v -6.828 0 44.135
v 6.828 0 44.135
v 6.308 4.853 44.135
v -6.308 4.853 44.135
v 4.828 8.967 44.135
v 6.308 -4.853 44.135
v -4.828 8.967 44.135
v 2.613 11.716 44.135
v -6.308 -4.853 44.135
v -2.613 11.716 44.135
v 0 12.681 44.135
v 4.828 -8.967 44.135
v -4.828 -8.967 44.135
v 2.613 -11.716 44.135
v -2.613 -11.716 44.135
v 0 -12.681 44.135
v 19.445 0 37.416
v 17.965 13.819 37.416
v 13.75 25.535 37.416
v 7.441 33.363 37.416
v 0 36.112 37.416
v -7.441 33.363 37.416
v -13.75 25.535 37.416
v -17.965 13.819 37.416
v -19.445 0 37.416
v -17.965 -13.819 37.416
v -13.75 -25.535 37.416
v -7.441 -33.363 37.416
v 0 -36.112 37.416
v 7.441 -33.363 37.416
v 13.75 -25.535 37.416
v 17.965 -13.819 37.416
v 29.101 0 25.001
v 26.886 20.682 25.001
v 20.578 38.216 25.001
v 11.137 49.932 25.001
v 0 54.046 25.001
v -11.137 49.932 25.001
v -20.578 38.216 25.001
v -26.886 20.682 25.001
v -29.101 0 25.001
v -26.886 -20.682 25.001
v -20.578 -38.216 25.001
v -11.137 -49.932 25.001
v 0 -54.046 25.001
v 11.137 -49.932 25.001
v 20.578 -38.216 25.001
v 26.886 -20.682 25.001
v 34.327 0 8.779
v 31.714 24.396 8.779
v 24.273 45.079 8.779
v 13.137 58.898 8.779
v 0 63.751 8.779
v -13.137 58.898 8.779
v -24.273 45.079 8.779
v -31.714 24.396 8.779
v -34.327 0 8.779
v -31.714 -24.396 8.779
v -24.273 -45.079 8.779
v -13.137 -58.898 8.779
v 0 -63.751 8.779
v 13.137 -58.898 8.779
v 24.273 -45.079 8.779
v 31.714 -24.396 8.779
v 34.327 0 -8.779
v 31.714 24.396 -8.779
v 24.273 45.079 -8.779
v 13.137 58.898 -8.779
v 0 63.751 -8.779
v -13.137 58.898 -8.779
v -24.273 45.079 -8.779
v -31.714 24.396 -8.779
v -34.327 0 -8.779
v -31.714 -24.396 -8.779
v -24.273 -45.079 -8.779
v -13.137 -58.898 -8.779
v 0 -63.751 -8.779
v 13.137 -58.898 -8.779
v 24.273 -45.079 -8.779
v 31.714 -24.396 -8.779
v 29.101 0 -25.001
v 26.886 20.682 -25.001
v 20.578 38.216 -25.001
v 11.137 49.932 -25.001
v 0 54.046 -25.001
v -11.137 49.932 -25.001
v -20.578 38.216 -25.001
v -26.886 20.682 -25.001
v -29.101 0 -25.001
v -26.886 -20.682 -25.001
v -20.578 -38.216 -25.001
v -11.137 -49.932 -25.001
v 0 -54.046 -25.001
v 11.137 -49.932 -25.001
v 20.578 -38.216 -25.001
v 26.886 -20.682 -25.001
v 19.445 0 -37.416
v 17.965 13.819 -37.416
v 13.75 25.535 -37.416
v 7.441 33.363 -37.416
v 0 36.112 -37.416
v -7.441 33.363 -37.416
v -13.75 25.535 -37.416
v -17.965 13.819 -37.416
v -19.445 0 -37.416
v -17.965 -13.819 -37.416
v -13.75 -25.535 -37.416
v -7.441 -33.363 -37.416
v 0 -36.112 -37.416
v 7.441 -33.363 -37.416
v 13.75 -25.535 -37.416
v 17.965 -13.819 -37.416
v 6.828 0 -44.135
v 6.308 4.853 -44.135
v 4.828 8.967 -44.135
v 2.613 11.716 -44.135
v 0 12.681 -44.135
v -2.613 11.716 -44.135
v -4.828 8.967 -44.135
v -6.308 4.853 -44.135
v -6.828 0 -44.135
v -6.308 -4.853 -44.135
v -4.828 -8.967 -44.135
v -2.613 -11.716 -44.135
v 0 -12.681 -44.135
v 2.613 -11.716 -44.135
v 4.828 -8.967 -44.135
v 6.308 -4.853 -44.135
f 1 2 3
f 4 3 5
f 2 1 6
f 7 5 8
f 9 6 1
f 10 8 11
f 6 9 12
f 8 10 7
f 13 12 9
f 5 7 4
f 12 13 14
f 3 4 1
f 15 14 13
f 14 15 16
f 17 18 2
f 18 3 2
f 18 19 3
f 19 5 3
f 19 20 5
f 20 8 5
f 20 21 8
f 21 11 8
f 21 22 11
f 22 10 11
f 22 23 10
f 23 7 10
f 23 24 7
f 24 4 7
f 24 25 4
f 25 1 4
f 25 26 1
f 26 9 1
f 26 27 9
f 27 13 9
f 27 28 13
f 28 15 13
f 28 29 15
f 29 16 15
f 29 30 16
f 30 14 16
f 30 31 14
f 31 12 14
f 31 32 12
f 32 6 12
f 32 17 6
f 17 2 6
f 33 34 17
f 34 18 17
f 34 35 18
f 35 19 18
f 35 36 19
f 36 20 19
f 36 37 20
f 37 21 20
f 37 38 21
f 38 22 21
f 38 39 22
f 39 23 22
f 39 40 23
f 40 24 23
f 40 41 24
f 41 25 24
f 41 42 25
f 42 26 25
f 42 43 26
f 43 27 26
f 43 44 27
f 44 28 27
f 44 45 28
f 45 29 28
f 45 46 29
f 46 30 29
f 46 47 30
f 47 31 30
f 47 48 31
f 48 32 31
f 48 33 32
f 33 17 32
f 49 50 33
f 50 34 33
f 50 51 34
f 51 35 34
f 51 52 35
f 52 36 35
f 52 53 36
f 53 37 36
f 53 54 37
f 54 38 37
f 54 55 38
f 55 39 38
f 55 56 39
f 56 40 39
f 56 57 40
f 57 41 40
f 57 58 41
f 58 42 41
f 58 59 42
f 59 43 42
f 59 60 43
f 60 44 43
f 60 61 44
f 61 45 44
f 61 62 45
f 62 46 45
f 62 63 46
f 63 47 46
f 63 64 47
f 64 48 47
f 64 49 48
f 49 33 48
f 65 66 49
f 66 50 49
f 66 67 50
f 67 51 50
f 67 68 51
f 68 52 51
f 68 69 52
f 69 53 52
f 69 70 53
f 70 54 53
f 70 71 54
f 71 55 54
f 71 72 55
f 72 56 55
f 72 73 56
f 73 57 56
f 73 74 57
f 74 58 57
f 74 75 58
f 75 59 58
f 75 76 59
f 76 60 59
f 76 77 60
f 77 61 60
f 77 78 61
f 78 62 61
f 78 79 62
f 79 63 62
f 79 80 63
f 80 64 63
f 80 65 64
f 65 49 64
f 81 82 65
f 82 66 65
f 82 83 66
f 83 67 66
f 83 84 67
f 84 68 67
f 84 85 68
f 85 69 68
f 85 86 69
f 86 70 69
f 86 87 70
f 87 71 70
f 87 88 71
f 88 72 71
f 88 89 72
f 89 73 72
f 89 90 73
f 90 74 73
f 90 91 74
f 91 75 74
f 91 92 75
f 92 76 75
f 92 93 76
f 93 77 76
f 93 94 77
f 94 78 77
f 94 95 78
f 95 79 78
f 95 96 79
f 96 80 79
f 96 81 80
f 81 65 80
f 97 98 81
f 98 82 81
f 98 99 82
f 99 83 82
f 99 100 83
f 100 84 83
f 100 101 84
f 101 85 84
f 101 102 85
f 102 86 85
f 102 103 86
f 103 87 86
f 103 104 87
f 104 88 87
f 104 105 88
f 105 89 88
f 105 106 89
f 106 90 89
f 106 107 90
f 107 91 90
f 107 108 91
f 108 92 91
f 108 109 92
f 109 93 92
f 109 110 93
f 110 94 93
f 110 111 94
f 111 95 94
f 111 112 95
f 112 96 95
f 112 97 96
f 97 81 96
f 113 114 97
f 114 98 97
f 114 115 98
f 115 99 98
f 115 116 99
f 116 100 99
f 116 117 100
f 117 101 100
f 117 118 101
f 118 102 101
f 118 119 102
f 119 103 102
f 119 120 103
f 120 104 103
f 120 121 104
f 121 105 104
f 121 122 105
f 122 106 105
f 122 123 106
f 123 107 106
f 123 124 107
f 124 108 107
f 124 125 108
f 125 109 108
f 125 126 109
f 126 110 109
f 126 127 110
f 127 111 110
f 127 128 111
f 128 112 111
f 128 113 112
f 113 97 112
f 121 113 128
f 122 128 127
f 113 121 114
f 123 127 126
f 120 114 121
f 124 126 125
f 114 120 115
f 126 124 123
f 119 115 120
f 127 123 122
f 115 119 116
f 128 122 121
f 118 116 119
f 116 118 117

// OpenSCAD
// Generated by SolidPython 1.0.1 on 2020-07-29 00:46:47


scale(v = [7, 13, 9]) {
	sphere(r = 5);
}
/***********************************************
*********      SolidPython code:      **********
************************************************
 
# import packages: SolidPython
from solid import *
from solid.utils import *
from itertools import chain, combinations, permutations


class Resize:

    def __init__(self, scad_file):
        self.scad_file = scad_file
        #self.scad_file = import_scad(scad_file)
        # cone/cylinder param:
        self.r1 = 0
        self.r2 = 0
        self.h = 0
        # rectangular prism param:
        self.w = 0
        self.l = 0
        # ellipse param:
        self.r = 0

    # import OpenScad code (file name corresponds to shape)


    # classify shape + parameters
    def assign(self, param1, param2, param3):
        if self.scad_file == 'cone.scad':
            self.r1 = param1
            self.r2 = param2
            self.h = param3
        elif self.scad_file == 'cylinder.scad':
            self.r1 = param1
            self.r2 = param2
            self.h = param3
        elif self.scad_file == 'rectangularPrism.scad':
            self.h = param1
            self.l = param2
            self.w = param3
        else:
            self.r = param1
            self.h = param2

    # resize parameters
    def iterate(self):
        x = range(3, 20, 2)
        i = 1
        if self.scad_file == 'cone.scad':
            tempList = list(permutations(x, 2))
            for temp in tempList:
                param1 = temp[0]
                param2 = temp[1]
                filepath = 'produced_scad_files/' + 'cone' + str(param1) + '_' + str(param2) + '_' + '.scad'
                scad_render_to_file(cylinder(h=param1, r1=param2, r2=0), filepath)

        elif self.scad_file == 'cylinder.scad':
            tempList = list(permutations(x, 3))
            for temp in tempList:
                param1 = temp[0]
                param2 = temp[1]
                filepath = 'produced_scad_files/' + 'cylinder' + str(param1) + '_' + str(param2) + '_' + '.scad'
                scad_render_to_file(cylinder(h=param1, r1=param2, r2=param2), filepath)

        elif self.scad_file == 'rectangularPrism.scad':
            tempList = list(permutations(x, 3))
            for temp in tempList:
                param1 = temp[0]
                param2 = temp[1]
                param3 = temp[2]
                filepath = 'produced_scad_files/' + 'rectangularPrism' + str(param1) + '_' + str(param2) + '_' + str(
                    param3) + '.scad'
                scad_render_to_file(cube(size=(param1, param2, param3)), filepath)

        elif self.scad_file == 'ellipse.scad':
            tempList = list(permutations(x, 4))
            for temp in tempList:
                param1 = temp[0]
                param2 = temp[1]
                param3 = temp[2]
                param4 = temp[3]
                filepath = 'produced_scad_files/' + 'ellipse' + str(param1) + '_' + str(param2) + '_' + str(param3) + '_' + str(param4) + '.scad'
                scad_render_to_file(scale([param1, param2, param3])(sphere(r=param4)), filepath)

    def render_to_scadfile(self):
        scad_render_to_file(scad, 'example.scad') 
 
************************************************/
